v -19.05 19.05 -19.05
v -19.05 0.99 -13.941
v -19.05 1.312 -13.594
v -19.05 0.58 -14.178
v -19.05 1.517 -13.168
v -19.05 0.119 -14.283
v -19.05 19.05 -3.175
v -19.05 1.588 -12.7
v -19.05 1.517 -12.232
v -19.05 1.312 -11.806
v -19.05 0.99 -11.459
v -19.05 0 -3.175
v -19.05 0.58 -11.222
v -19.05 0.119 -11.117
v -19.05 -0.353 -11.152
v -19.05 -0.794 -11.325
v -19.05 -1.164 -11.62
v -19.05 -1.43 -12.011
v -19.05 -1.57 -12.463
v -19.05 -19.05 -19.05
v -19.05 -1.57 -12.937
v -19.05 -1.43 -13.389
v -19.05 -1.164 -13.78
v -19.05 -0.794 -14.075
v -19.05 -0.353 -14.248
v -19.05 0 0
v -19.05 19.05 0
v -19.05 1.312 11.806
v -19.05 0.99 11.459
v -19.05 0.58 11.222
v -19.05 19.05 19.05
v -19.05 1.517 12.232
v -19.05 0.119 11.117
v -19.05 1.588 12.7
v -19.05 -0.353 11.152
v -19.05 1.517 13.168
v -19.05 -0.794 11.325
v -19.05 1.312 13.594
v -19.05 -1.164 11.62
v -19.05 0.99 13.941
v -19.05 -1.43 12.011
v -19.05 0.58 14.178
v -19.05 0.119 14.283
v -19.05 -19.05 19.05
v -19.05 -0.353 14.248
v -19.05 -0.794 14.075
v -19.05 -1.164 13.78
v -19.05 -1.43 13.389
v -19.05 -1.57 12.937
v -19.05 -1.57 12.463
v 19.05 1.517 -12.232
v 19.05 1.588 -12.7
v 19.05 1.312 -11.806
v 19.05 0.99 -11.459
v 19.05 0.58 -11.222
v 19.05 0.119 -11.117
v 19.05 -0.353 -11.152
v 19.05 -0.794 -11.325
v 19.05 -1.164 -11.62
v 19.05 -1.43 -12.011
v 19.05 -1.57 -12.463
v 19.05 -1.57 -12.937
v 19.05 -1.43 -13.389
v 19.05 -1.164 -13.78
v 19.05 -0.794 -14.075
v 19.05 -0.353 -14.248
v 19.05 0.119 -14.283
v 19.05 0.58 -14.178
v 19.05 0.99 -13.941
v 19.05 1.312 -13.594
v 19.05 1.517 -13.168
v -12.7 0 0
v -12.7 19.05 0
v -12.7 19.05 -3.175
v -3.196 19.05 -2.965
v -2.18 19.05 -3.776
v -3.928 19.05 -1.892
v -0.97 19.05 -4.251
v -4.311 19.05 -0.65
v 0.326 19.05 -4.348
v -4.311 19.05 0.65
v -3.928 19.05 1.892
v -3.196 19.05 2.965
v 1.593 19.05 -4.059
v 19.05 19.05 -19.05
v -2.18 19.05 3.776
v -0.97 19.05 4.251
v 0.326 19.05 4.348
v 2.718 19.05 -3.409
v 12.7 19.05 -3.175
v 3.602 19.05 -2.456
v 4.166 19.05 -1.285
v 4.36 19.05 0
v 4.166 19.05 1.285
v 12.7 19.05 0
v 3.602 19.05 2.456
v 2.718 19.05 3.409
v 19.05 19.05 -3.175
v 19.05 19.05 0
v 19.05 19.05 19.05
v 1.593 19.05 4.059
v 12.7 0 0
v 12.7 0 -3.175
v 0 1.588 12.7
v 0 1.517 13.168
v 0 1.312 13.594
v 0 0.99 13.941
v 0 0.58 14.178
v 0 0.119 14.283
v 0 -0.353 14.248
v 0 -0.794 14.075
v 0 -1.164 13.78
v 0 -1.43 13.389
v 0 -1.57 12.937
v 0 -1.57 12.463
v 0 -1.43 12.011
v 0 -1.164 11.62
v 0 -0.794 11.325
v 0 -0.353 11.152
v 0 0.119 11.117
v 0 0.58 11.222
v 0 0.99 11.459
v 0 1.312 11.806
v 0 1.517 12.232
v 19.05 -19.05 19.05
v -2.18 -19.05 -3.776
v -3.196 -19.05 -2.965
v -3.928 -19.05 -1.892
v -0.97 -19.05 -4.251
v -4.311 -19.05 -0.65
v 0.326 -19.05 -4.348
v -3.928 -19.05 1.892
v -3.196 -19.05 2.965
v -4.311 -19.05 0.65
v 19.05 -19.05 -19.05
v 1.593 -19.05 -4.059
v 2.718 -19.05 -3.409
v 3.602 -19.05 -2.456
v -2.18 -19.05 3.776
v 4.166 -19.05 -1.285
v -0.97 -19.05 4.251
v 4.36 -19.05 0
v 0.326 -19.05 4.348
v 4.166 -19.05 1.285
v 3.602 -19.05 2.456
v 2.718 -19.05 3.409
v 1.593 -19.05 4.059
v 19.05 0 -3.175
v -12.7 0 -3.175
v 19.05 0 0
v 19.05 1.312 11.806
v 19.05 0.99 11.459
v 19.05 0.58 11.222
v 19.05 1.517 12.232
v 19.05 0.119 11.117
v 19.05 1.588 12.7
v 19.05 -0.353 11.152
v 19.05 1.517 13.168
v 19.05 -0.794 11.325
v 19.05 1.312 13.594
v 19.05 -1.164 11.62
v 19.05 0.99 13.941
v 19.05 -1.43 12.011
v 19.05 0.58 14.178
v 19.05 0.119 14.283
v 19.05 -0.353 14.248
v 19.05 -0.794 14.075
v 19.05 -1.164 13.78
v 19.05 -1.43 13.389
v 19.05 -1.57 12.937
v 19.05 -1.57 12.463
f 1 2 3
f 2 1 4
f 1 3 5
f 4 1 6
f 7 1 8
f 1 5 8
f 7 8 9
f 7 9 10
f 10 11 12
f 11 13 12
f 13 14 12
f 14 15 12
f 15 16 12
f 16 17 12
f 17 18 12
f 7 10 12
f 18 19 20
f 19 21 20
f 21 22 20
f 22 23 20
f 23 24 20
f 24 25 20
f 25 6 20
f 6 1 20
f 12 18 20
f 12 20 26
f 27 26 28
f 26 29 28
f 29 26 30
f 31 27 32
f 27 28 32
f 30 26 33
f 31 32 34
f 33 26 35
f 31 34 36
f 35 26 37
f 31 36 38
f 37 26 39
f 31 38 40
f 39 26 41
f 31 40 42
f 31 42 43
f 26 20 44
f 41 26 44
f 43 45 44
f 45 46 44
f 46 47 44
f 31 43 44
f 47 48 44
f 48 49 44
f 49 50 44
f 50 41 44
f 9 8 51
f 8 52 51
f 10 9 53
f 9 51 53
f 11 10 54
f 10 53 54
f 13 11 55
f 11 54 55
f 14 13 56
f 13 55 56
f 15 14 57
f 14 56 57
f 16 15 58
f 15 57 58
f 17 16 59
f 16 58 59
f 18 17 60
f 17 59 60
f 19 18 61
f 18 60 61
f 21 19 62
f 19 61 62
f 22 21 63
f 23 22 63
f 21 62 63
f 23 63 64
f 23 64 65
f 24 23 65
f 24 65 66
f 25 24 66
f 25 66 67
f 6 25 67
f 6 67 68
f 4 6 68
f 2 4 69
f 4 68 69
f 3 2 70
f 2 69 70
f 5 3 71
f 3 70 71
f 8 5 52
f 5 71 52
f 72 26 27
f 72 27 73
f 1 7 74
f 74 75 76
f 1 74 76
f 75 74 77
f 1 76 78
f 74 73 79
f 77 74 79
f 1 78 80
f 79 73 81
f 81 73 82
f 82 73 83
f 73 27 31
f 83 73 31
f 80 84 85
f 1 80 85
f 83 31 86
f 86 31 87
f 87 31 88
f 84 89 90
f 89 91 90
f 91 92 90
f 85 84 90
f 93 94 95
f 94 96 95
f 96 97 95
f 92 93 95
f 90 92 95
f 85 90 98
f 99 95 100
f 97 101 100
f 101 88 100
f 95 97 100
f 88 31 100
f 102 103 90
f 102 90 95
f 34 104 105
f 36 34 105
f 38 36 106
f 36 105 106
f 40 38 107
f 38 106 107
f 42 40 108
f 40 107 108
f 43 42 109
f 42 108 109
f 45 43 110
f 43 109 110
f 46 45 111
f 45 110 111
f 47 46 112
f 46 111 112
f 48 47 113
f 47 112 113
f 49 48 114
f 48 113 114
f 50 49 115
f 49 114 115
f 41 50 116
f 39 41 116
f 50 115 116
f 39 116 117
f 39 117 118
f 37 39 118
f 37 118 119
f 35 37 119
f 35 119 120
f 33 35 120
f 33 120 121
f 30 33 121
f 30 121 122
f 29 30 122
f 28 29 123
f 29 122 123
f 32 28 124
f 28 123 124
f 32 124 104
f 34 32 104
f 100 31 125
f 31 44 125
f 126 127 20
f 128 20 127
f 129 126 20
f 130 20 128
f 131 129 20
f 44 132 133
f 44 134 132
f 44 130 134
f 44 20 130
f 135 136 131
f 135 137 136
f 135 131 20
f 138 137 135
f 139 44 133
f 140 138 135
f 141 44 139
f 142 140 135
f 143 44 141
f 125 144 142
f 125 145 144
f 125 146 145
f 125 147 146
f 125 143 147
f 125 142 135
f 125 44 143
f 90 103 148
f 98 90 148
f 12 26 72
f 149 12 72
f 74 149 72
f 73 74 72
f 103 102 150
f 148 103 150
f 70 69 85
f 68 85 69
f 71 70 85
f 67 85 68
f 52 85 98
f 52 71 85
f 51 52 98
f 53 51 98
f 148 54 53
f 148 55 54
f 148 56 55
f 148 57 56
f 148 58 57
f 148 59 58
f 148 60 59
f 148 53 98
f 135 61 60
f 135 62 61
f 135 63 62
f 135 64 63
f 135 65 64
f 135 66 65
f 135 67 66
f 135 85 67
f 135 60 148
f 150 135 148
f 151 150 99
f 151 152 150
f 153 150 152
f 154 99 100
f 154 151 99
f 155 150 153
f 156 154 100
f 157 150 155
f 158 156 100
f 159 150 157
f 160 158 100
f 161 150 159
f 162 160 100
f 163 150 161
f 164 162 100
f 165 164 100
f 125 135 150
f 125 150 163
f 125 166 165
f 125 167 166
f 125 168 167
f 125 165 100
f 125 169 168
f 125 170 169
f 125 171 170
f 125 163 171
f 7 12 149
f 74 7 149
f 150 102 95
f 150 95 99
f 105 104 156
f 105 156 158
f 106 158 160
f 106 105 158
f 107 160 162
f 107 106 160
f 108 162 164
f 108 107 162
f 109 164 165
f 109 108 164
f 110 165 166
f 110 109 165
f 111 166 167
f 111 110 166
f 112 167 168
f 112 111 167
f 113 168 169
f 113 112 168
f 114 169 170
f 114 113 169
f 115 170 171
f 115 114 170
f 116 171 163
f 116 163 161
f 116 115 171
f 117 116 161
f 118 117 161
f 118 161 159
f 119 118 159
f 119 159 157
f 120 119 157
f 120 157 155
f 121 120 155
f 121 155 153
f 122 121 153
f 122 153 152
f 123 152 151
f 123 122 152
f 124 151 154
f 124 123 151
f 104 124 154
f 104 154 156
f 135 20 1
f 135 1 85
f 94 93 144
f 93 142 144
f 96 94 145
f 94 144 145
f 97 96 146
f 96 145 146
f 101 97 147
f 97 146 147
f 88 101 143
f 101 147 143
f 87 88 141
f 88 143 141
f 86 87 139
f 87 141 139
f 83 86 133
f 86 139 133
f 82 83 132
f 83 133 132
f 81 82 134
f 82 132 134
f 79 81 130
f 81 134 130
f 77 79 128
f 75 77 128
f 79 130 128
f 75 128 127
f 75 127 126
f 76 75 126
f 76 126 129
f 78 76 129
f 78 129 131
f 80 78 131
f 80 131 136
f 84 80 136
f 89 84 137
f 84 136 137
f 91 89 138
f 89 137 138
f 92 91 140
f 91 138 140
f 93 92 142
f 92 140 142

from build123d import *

# Parameters (mm, degrees)
F0_W     = 38.1
F0_H     = 38.1
F6_DEPTH = 19.05
F1_R     = 4.35991
F7_DEPTH = 19.05
F2_W     = 6.35
F2_H     = 3.175
F3_W     = 6.35
F3_H     = 3.175
F8_DEPTH = 19.05
F4_R     = 1.5875
F5_R     = 1.5875
F9_DEPTH = 19.05


with BuildPart() as f6:
    # F0 (on Front) → F6 (new body, symmetric)
    with BuildSketch(Plane.XZ):
        Rectangle(F0_W, F0_H)
    extrude(amount=F6_DEPTH, both=True)

    # F1 (on Front) → F7 (cut, symmetric)
    with BuildSketch(Plane.XZ):
        Circle(F1_R)
    extrude(amount=F7_DEPTH, both=True, mode=Mode.SUBTRACT)

    # F2 (on Front) + F3 (on Front) → F8 (cut, through all)
    with BuildSketch(Plane.XZ):
        with Locations((-15.875, -1.5875)):
            Rectangle(F2_W, F2_H)
    with BuildSketch(Plane.XZ):
        with Locations((15.875, -1.5875)):
            Rectangle(F3_W, F3_H)
    extrude(amount=-F8_DEPTH, mode=Mode.SUBTRACT)

    # F4 (on Right) + F5 (on Right) → F9 (cut, symmetric)
    with BuildSketch(Plane.YZ):
        with Locations((0, 12.7)):
            Circle(F4_R)
    with BuildSketch(Plane.YZ):
        with Locations((0, -12.7)):
            Circle(F5_R)
    extrude(amount=F9_DEPTH, both=True, mode=Mode.SUBTRACT)


solid = f6.part
